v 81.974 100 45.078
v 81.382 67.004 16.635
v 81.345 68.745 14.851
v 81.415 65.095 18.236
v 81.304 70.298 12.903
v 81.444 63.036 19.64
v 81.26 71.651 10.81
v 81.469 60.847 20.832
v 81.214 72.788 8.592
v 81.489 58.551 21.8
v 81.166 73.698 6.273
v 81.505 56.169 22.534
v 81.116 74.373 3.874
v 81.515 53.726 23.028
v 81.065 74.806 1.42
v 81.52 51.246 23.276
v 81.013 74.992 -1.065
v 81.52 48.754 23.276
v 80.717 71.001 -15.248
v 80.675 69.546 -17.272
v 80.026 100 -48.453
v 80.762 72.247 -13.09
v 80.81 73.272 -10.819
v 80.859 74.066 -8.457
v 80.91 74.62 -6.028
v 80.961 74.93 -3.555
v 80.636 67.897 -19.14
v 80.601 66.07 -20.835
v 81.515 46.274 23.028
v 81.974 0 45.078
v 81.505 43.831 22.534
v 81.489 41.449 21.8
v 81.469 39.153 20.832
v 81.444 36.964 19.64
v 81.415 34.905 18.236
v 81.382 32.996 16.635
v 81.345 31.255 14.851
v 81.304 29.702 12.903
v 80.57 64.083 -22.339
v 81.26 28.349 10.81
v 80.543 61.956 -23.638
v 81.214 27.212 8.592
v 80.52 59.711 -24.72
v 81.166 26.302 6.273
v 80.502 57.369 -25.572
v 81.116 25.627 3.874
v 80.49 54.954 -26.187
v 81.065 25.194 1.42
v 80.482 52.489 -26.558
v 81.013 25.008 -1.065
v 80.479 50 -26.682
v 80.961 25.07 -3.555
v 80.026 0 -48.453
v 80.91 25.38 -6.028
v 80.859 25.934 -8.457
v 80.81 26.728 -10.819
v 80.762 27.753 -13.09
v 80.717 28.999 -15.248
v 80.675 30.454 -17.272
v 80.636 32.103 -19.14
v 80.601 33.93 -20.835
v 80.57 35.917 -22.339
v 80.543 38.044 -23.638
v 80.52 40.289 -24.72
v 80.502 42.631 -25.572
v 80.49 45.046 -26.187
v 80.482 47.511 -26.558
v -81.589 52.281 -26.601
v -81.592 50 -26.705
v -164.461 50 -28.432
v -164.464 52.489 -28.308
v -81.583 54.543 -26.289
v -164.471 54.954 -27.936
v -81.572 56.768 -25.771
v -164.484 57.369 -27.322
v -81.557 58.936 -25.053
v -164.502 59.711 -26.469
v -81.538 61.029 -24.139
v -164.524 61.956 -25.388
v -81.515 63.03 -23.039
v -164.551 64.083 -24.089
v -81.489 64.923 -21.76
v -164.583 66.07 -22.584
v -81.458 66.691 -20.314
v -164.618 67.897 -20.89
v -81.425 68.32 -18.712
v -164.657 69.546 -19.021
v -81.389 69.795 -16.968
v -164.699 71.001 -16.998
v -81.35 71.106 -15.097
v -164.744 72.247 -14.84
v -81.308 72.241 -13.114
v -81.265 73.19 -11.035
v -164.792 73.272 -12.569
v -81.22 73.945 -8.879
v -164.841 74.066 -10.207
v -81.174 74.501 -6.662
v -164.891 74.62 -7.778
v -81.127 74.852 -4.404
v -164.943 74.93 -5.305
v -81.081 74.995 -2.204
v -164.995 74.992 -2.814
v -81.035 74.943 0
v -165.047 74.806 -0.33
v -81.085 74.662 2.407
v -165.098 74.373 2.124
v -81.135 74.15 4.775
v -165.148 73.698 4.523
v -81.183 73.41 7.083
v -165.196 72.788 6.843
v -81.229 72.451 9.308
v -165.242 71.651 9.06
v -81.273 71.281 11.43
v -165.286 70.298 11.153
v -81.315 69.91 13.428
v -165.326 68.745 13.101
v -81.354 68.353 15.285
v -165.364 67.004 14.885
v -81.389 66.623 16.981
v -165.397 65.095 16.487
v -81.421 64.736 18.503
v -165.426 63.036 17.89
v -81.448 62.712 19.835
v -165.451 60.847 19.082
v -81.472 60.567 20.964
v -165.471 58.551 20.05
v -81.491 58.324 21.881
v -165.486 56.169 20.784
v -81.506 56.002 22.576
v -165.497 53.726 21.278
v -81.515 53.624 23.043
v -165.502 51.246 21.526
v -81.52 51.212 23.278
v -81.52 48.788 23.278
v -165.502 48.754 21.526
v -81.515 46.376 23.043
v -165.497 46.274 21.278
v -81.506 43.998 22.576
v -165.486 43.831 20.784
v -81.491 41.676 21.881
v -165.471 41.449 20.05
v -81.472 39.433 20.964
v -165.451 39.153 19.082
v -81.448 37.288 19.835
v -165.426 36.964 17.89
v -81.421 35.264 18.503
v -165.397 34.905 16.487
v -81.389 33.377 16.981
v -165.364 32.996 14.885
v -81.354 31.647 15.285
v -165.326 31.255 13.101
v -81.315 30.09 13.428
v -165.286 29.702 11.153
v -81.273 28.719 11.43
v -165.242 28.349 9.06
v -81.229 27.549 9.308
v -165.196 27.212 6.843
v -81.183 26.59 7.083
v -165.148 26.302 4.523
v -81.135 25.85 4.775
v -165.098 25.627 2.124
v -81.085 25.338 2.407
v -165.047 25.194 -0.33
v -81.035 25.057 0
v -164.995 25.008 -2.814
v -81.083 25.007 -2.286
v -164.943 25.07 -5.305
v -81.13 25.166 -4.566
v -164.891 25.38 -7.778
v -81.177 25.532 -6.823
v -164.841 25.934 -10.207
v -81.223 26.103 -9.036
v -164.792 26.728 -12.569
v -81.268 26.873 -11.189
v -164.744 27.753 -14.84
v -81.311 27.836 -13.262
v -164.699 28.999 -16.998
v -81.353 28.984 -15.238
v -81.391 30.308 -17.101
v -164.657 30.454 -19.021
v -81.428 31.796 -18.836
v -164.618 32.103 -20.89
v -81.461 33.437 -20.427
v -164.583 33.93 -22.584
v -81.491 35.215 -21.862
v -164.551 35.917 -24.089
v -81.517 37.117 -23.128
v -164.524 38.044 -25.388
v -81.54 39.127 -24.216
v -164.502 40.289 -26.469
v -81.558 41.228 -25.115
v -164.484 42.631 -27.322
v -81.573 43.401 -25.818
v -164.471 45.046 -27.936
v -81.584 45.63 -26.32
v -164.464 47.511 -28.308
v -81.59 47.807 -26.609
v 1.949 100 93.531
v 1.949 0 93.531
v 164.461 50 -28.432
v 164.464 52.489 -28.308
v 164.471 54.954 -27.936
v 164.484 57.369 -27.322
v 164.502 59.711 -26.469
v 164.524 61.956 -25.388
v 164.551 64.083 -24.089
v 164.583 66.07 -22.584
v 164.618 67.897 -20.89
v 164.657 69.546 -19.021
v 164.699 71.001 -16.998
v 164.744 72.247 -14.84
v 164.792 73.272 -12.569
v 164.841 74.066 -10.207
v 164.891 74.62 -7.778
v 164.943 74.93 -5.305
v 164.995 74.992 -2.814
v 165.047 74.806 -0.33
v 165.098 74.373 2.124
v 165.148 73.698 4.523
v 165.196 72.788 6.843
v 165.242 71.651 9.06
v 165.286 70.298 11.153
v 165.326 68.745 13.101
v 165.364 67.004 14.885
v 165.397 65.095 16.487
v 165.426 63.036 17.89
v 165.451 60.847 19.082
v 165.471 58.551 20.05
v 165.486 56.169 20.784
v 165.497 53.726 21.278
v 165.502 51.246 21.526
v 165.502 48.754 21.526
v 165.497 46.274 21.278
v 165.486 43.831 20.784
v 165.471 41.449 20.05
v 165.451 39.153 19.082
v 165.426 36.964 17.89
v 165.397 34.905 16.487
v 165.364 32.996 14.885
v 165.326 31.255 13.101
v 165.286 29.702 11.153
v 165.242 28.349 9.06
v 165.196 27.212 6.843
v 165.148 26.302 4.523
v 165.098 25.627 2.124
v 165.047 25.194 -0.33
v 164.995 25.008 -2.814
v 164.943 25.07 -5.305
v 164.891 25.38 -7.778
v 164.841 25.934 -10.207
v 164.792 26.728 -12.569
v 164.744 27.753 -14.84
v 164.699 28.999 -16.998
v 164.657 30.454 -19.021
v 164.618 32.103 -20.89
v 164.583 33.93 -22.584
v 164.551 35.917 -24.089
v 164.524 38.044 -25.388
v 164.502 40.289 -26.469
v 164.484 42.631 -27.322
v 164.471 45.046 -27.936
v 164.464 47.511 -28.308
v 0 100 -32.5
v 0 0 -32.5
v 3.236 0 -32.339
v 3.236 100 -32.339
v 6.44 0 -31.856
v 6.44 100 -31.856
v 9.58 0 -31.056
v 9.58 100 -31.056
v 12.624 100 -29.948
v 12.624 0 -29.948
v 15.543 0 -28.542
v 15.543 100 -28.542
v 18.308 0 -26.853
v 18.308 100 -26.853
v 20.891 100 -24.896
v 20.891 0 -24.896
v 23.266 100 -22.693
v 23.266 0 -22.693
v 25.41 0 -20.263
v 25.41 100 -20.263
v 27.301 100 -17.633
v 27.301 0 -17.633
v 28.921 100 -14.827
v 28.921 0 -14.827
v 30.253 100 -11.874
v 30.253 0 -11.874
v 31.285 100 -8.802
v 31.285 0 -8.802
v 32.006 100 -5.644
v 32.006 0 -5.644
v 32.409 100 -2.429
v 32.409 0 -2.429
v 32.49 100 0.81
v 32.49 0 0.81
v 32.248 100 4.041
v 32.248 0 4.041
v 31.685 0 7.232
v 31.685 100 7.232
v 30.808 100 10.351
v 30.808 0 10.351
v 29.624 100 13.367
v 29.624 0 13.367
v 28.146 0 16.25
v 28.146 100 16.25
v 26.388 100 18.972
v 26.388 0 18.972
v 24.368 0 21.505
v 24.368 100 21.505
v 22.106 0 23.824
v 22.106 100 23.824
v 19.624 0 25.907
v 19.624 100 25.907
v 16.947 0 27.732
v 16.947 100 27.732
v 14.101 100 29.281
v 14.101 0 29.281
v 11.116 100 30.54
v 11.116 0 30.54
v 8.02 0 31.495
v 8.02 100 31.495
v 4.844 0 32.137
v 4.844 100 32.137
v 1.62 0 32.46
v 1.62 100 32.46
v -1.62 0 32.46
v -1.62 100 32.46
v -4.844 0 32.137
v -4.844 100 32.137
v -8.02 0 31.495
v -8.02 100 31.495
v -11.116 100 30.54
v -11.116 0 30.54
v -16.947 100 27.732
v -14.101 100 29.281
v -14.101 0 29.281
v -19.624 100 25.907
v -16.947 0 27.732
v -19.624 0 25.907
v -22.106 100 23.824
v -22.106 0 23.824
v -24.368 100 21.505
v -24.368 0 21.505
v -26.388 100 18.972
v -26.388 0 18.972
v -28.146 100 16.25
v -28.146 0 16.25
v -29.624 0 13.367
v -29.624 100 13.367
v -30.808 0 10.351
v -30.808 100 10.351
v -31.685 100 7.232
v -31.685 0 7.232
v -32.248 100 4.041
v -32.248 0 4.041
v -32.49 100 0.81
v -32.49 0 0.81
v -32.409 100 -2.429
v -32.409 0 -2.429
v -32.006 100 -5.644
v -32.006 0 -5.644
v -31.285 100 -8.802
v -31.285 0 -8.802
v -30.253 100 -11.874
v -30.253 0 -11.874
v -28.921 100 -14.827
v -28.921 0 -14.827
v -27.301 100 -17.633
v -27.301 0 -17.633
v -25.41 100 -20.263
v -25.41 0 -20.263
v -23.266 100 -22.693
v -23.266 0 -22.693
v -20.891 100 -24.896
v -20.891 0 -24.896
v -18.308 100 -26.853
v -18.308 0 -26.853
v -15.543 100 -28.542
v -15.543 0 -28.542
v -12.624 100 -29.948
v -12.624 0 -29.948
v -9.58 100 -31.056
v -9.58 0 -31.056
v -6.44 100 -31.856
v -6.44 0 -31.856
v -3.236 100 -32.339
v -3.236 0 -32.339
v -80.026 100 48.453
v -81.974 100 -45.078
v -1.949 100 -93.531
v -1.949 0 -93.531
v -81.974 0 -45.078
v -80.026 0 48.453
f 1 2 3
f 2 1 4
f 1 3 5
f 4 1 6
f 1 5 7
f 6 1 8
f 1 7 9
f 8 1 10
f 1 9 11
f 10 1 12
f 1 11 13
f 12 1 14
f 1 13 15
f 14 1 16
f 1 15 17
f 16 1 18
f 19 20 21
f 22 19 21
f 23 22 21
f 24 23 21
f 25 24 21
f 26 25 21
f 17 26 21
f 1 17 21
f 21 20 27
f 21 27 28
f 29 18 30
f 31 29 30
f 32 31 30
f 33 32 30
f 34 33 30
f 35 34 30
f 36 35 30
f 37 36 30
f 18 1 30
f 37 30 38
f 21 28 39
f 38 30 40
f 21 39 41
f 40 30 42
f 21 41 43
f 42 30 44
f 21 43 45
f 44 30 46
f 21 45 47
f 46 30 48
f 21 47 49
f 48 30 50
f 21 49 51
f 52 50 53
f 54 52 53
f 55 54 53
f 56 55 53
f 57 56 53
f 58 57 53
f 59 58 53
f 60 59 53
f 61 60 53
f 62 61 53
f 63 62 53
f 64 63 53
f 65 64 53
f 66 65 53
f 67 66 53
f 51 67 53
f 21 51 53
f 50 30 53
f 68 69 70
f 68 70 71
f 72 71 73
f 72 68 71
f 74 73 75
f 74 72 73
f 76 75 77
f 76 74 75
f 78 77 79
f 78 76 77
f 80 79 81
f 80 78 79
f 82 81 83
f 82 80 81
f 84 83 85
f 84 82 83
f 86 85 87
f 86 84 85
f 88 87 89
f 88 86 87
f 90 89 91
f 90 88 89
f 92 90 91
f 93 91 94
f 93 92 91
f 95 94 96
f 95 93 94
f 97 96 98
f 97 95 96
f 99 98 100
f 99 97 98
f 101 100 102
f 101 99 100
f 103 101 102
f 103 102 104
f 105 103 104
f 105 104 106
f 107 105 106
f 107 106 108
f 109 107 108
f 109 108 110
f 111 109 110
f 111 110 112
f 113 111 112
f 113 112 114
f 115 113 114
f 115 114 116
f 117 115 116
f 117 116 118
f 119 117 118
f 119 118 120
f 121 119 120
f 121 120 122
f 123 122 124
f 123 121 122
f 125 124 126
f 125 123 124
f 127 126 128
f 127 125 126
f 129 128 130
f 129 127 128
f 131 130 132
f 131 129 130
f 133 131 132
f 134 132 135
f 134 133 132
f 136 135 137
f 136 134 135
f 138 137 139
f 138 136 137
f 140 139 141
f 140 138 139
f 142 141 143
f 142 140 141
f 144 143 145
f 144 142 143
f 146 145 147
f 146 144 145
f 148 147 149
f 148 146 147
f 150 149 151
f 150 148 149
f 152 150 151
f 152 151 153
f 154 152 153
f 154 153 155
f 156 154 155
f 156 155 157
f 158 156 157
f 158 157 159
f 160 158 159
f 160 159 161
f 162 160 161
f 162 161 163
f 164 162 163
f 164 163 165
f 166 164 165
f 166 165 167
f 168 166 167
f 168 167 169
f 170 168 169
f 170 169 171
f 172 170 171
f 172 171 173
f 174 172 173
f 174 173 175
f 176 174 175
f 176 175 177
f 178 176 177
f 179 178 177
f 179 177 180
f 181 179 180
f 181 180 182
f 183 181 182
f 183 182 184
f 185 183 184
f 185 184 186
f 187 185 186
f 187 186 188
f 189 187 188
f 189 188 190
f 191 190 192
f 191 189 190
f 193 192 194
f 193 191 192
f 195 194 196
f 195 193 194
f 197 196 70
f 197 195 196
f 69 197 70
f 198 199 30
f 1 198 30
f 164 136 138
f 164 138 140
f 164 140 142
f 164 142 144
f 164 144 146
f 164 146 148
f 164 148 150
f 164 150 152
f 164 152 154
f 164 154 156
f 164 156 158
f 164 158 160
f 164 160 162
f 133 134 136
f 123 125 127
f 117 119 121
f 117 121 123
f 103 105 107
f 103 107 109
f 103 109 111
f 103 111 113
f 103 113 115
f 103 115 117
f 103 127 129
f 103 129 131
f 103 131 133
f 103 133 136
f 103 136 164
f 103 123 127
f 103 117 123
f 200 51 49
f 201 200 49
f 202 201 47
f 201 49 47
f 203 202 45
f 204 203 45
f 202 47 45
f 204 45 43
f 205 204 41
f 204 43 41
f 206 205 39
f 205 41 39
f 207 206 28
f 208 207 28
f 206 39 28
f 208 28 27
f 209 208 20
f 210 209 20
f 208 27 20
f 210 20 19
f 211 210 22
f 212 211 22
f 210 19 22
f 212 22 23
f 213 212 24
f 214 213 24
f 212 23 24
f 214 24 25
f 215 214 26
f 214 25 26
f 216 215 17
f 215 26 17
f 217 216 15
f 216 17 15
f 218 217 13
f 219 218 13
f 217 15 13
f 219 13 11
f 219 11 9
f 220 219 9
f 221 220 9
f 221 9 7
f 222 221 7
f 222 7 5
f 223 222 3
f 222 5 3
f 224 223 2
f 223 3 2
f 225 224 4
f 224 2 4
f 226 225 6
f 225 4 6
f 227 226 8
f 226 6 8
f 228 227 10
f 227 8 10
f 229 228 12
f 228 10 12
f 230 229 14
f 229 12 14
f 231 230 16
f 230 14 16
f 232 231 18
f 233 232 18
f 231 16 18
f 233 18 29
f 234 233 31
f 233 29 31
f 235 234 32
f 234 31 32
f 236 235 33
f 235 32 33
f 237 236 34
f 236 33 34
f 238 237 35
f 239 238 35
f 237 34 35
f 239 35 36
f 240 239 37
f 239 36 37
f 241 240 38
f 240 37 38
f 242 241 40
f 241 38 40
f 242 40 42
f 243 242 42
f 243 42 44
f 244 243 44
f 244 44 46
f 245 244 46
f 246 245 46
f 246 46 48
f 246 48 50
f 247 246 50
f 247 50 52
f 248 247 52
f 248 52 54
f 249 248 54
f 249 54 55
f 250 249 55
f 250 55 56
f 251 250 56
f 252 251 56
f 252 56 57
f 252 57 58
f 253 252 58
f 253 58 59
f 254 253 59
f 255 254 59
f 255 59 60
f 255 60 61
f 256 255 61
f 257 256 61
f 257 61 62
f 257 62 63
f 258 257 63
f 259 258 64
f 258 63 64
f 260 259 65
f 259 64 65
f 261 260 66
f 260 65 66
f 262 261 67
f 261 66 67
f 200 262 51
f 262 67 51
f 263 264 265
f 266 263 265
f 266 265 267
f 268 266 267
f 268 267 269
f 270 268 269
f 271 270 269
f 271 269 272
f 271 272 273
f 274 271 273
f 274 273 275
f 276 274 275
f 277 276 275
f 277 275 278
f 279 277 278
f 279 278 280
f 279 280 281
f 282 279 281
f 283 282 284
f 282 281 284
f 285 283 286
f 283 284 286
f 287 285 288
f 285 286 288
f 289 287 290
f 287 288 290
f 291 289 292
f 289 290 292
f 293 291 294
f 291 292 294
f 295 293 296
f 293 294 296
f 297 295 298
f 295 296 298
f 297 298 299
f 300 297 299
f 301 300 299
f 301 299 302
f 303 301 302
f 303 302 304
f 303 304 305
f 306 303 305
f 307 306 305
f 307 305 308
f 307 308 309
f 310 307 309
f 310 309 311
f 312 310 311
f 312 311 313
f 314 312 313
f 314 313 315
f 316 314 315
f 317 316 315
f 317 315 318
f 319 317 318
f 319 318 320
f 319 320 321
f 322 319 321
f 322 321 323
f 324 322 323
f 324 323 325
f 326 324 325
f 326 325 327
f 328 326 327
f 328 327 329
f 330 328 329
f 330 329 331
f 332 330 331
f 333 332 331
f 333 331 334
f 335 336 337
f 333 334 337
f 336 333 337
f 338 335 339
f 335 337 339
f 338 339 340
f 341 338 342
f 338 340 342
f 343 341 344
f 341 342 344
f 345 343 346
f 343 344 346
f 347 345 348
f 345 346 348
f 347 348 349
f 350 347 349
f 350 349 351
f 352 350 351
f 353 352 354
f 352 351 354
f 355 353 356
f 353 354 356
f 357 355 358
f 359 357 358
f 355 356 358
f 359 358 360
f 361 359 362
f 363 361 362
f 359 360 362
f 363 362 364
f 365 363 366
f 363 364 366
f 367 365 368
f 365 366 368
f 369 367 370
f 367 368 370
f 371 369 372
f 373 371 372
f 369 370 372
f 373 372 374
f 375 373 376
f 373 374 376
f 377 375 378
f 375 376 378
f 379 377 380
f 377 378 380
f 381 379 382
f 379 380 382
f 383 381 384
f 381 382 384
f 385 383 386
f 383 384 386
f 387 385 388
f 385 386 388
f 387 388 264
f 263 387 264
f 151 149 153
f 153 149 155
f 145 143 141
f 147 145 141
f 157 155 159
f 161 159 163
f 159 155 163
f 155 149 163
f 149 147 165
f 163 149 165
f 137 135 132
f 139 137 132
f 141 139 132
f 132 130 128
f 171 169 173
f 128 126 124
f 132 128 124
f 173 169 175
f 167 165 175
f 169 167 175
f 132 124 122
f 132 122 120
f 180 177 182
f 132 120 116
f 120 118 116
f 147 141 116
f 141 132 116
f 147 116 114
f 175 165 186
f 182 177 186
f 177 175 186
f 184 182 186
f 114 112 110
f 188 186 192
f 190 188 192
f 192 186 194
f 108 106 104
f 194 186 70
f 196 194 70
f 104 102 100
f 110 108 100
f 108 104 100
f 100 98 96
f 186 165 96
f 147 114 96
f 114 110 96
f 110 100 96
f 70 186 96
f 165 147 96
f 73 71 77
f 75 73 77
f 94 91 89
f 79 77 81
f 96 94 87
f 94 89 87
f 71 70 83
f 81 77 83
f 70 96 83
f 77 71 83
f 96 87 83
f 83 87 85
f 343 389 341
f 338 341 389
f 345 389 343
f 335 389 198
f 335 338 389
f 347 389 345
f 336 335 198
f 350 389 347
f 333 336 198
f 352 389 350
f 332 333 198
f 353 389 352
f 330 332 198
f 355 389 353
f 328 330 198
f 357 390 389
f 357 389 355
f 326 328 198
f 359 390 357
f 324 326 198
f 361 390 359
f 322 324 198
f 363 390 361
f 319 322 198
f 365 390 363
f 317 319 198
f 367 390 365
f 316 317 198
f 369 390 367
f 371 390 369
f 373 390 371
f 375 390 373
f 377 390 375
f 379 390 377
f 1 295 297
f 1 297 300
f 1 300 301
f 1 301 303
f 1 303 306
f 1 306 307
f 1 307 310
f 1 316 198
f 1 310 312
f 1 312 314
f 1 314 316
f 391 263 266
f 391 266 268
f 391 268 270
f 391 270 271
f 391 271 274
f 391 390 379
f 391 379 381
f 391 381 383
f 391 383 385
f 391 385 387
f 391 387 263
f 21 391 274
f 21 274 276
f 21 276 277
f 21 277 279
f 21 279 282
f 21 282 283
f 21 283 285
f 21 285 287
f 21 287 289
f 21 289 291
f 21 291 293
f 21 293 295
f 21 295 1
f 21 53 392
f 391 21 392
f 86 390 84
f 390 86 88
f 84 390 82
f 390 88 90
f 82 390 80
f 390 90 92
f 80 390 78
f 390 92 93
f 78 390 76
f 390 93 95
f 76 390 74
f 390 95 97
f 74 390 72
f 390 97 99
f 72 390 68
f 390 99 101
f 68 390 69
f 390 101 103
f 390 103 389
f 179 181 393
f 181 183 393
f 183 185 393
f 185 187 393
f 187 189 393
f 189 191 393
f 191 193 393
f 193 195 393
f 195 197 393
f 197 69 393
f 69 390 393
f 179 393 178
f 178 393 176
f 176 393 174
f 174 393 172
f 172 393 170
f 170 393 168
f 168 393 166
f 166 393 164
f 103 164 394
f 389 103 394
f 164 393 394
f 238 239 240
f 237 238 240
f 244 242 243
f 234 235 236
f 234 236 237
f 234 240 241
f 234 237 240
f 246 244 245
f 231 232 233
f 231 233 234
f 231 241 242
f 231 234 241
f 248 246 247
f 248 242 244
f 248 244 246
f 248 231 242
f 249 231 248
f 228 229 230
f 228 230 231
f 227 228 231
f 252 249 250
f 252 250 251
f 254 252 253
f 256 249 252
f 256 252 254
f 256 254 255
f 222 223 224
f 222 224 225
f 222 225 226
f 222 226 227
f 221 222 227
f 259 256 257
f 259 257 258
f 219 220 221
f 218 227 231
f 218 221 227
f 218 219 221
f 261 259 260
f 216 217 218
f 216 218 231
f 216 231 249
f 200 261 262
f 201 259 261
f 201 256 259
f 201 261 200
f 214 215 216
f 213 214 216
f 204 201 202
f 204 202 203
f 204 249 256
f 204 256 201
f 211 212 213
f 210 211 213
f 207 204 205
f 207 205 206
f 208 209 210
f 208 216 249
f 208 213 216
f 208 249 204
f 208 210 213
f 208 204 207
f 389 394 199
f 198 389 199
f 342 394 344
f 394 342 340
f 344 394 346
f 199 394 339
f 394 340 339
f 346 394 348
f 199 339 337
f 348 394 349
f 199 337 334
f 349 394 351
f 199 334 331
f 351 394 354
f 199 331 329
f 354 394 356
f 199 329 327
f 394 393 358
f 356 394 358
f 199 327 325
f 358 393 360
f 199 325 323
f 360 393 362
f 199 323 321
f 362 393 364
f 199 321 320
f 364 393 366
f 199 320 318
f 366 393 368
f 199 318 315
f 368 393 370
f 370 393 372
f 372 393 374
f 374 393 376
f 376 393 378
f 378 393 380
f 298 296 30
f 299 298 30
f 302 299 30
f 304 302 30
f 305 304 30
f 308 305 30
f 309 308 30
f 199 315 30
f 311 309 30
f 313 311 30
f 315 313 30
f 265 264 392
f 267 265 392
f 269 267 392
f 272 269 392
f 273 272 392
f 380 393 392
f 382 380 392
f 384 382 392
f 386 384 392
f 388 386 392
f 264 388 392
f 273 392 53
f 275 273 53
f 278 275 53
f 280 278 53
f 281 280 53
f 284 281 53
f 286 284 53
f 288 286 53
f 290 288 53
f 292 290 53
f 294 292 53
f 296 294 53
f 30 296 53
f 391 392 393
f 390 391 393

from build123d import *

# Parameters (mm, degrees)
BOSS_EXTRUDE1_DEPTH = 100
SKETCH6_R           = 32.5
CUT_EXTRUDE1_DEPTH  = 160.58632929
SKETCH7_R           = 25
BOSS_EXTRUDE2_DEPTH = 84


with BuildPart() as part:
    # Sketch5 → Boss-Extrude1 (new body)
    with BuildSketch(Plane(origin=(0, 0, 0), x_dir=(1, 0, 0), z_dir=(0, 1, 0))):
        Polygon((-80.025635128, -48.453021269), (1.948729745, -93.530743609), (81.974364872, -45.07772234), (80.025635128, 48.453021269), (-1.948729745, 93.530743609), (-81.974364872, 45.07772234), align=None)
    extrude(amount=BOSS_EXTRUDE1_DEPTH)

    # Sketch6 → Cut-Extrude1 (cut, through all)
    with BuildSketch(Plane(origin=(0, 0, 0), x_dir=(-1, 0, 0), z_dir=(0, -1, 0))):
        with Locations(Location((0, 0, 0), (0, 0, 90))):
            Circle(SKETCH6_R)
    extrude(amount=-CUT_EXTRUDE1_DEPTH, mode=Mode.SUBTRACT)

    # Sketch7 → Boss-Extrude2 (add)
    with BuildSketch(Plane(origin=(81, 0, -1.687649464), x_dir=(-0.020830657718770396, 0, -0.9997830183089746), z_dir=(0.9997830183089746, 0, -0.020830657718770396))):
        with Locations((0, 50)):
            Circle(SKETCH7_R)
    boss_extrude2 = extrude(amount=BOSS_EXTRUDE2_DEPTH)

    # Mirror1: Boss-Extrude2 across plane
    add(boss_extrude2.mirror(Plane(origin=(0, 0, 0), x_dir=(0, 0, 1), z_dir=(1, 0, 0))))


solid = part.part
